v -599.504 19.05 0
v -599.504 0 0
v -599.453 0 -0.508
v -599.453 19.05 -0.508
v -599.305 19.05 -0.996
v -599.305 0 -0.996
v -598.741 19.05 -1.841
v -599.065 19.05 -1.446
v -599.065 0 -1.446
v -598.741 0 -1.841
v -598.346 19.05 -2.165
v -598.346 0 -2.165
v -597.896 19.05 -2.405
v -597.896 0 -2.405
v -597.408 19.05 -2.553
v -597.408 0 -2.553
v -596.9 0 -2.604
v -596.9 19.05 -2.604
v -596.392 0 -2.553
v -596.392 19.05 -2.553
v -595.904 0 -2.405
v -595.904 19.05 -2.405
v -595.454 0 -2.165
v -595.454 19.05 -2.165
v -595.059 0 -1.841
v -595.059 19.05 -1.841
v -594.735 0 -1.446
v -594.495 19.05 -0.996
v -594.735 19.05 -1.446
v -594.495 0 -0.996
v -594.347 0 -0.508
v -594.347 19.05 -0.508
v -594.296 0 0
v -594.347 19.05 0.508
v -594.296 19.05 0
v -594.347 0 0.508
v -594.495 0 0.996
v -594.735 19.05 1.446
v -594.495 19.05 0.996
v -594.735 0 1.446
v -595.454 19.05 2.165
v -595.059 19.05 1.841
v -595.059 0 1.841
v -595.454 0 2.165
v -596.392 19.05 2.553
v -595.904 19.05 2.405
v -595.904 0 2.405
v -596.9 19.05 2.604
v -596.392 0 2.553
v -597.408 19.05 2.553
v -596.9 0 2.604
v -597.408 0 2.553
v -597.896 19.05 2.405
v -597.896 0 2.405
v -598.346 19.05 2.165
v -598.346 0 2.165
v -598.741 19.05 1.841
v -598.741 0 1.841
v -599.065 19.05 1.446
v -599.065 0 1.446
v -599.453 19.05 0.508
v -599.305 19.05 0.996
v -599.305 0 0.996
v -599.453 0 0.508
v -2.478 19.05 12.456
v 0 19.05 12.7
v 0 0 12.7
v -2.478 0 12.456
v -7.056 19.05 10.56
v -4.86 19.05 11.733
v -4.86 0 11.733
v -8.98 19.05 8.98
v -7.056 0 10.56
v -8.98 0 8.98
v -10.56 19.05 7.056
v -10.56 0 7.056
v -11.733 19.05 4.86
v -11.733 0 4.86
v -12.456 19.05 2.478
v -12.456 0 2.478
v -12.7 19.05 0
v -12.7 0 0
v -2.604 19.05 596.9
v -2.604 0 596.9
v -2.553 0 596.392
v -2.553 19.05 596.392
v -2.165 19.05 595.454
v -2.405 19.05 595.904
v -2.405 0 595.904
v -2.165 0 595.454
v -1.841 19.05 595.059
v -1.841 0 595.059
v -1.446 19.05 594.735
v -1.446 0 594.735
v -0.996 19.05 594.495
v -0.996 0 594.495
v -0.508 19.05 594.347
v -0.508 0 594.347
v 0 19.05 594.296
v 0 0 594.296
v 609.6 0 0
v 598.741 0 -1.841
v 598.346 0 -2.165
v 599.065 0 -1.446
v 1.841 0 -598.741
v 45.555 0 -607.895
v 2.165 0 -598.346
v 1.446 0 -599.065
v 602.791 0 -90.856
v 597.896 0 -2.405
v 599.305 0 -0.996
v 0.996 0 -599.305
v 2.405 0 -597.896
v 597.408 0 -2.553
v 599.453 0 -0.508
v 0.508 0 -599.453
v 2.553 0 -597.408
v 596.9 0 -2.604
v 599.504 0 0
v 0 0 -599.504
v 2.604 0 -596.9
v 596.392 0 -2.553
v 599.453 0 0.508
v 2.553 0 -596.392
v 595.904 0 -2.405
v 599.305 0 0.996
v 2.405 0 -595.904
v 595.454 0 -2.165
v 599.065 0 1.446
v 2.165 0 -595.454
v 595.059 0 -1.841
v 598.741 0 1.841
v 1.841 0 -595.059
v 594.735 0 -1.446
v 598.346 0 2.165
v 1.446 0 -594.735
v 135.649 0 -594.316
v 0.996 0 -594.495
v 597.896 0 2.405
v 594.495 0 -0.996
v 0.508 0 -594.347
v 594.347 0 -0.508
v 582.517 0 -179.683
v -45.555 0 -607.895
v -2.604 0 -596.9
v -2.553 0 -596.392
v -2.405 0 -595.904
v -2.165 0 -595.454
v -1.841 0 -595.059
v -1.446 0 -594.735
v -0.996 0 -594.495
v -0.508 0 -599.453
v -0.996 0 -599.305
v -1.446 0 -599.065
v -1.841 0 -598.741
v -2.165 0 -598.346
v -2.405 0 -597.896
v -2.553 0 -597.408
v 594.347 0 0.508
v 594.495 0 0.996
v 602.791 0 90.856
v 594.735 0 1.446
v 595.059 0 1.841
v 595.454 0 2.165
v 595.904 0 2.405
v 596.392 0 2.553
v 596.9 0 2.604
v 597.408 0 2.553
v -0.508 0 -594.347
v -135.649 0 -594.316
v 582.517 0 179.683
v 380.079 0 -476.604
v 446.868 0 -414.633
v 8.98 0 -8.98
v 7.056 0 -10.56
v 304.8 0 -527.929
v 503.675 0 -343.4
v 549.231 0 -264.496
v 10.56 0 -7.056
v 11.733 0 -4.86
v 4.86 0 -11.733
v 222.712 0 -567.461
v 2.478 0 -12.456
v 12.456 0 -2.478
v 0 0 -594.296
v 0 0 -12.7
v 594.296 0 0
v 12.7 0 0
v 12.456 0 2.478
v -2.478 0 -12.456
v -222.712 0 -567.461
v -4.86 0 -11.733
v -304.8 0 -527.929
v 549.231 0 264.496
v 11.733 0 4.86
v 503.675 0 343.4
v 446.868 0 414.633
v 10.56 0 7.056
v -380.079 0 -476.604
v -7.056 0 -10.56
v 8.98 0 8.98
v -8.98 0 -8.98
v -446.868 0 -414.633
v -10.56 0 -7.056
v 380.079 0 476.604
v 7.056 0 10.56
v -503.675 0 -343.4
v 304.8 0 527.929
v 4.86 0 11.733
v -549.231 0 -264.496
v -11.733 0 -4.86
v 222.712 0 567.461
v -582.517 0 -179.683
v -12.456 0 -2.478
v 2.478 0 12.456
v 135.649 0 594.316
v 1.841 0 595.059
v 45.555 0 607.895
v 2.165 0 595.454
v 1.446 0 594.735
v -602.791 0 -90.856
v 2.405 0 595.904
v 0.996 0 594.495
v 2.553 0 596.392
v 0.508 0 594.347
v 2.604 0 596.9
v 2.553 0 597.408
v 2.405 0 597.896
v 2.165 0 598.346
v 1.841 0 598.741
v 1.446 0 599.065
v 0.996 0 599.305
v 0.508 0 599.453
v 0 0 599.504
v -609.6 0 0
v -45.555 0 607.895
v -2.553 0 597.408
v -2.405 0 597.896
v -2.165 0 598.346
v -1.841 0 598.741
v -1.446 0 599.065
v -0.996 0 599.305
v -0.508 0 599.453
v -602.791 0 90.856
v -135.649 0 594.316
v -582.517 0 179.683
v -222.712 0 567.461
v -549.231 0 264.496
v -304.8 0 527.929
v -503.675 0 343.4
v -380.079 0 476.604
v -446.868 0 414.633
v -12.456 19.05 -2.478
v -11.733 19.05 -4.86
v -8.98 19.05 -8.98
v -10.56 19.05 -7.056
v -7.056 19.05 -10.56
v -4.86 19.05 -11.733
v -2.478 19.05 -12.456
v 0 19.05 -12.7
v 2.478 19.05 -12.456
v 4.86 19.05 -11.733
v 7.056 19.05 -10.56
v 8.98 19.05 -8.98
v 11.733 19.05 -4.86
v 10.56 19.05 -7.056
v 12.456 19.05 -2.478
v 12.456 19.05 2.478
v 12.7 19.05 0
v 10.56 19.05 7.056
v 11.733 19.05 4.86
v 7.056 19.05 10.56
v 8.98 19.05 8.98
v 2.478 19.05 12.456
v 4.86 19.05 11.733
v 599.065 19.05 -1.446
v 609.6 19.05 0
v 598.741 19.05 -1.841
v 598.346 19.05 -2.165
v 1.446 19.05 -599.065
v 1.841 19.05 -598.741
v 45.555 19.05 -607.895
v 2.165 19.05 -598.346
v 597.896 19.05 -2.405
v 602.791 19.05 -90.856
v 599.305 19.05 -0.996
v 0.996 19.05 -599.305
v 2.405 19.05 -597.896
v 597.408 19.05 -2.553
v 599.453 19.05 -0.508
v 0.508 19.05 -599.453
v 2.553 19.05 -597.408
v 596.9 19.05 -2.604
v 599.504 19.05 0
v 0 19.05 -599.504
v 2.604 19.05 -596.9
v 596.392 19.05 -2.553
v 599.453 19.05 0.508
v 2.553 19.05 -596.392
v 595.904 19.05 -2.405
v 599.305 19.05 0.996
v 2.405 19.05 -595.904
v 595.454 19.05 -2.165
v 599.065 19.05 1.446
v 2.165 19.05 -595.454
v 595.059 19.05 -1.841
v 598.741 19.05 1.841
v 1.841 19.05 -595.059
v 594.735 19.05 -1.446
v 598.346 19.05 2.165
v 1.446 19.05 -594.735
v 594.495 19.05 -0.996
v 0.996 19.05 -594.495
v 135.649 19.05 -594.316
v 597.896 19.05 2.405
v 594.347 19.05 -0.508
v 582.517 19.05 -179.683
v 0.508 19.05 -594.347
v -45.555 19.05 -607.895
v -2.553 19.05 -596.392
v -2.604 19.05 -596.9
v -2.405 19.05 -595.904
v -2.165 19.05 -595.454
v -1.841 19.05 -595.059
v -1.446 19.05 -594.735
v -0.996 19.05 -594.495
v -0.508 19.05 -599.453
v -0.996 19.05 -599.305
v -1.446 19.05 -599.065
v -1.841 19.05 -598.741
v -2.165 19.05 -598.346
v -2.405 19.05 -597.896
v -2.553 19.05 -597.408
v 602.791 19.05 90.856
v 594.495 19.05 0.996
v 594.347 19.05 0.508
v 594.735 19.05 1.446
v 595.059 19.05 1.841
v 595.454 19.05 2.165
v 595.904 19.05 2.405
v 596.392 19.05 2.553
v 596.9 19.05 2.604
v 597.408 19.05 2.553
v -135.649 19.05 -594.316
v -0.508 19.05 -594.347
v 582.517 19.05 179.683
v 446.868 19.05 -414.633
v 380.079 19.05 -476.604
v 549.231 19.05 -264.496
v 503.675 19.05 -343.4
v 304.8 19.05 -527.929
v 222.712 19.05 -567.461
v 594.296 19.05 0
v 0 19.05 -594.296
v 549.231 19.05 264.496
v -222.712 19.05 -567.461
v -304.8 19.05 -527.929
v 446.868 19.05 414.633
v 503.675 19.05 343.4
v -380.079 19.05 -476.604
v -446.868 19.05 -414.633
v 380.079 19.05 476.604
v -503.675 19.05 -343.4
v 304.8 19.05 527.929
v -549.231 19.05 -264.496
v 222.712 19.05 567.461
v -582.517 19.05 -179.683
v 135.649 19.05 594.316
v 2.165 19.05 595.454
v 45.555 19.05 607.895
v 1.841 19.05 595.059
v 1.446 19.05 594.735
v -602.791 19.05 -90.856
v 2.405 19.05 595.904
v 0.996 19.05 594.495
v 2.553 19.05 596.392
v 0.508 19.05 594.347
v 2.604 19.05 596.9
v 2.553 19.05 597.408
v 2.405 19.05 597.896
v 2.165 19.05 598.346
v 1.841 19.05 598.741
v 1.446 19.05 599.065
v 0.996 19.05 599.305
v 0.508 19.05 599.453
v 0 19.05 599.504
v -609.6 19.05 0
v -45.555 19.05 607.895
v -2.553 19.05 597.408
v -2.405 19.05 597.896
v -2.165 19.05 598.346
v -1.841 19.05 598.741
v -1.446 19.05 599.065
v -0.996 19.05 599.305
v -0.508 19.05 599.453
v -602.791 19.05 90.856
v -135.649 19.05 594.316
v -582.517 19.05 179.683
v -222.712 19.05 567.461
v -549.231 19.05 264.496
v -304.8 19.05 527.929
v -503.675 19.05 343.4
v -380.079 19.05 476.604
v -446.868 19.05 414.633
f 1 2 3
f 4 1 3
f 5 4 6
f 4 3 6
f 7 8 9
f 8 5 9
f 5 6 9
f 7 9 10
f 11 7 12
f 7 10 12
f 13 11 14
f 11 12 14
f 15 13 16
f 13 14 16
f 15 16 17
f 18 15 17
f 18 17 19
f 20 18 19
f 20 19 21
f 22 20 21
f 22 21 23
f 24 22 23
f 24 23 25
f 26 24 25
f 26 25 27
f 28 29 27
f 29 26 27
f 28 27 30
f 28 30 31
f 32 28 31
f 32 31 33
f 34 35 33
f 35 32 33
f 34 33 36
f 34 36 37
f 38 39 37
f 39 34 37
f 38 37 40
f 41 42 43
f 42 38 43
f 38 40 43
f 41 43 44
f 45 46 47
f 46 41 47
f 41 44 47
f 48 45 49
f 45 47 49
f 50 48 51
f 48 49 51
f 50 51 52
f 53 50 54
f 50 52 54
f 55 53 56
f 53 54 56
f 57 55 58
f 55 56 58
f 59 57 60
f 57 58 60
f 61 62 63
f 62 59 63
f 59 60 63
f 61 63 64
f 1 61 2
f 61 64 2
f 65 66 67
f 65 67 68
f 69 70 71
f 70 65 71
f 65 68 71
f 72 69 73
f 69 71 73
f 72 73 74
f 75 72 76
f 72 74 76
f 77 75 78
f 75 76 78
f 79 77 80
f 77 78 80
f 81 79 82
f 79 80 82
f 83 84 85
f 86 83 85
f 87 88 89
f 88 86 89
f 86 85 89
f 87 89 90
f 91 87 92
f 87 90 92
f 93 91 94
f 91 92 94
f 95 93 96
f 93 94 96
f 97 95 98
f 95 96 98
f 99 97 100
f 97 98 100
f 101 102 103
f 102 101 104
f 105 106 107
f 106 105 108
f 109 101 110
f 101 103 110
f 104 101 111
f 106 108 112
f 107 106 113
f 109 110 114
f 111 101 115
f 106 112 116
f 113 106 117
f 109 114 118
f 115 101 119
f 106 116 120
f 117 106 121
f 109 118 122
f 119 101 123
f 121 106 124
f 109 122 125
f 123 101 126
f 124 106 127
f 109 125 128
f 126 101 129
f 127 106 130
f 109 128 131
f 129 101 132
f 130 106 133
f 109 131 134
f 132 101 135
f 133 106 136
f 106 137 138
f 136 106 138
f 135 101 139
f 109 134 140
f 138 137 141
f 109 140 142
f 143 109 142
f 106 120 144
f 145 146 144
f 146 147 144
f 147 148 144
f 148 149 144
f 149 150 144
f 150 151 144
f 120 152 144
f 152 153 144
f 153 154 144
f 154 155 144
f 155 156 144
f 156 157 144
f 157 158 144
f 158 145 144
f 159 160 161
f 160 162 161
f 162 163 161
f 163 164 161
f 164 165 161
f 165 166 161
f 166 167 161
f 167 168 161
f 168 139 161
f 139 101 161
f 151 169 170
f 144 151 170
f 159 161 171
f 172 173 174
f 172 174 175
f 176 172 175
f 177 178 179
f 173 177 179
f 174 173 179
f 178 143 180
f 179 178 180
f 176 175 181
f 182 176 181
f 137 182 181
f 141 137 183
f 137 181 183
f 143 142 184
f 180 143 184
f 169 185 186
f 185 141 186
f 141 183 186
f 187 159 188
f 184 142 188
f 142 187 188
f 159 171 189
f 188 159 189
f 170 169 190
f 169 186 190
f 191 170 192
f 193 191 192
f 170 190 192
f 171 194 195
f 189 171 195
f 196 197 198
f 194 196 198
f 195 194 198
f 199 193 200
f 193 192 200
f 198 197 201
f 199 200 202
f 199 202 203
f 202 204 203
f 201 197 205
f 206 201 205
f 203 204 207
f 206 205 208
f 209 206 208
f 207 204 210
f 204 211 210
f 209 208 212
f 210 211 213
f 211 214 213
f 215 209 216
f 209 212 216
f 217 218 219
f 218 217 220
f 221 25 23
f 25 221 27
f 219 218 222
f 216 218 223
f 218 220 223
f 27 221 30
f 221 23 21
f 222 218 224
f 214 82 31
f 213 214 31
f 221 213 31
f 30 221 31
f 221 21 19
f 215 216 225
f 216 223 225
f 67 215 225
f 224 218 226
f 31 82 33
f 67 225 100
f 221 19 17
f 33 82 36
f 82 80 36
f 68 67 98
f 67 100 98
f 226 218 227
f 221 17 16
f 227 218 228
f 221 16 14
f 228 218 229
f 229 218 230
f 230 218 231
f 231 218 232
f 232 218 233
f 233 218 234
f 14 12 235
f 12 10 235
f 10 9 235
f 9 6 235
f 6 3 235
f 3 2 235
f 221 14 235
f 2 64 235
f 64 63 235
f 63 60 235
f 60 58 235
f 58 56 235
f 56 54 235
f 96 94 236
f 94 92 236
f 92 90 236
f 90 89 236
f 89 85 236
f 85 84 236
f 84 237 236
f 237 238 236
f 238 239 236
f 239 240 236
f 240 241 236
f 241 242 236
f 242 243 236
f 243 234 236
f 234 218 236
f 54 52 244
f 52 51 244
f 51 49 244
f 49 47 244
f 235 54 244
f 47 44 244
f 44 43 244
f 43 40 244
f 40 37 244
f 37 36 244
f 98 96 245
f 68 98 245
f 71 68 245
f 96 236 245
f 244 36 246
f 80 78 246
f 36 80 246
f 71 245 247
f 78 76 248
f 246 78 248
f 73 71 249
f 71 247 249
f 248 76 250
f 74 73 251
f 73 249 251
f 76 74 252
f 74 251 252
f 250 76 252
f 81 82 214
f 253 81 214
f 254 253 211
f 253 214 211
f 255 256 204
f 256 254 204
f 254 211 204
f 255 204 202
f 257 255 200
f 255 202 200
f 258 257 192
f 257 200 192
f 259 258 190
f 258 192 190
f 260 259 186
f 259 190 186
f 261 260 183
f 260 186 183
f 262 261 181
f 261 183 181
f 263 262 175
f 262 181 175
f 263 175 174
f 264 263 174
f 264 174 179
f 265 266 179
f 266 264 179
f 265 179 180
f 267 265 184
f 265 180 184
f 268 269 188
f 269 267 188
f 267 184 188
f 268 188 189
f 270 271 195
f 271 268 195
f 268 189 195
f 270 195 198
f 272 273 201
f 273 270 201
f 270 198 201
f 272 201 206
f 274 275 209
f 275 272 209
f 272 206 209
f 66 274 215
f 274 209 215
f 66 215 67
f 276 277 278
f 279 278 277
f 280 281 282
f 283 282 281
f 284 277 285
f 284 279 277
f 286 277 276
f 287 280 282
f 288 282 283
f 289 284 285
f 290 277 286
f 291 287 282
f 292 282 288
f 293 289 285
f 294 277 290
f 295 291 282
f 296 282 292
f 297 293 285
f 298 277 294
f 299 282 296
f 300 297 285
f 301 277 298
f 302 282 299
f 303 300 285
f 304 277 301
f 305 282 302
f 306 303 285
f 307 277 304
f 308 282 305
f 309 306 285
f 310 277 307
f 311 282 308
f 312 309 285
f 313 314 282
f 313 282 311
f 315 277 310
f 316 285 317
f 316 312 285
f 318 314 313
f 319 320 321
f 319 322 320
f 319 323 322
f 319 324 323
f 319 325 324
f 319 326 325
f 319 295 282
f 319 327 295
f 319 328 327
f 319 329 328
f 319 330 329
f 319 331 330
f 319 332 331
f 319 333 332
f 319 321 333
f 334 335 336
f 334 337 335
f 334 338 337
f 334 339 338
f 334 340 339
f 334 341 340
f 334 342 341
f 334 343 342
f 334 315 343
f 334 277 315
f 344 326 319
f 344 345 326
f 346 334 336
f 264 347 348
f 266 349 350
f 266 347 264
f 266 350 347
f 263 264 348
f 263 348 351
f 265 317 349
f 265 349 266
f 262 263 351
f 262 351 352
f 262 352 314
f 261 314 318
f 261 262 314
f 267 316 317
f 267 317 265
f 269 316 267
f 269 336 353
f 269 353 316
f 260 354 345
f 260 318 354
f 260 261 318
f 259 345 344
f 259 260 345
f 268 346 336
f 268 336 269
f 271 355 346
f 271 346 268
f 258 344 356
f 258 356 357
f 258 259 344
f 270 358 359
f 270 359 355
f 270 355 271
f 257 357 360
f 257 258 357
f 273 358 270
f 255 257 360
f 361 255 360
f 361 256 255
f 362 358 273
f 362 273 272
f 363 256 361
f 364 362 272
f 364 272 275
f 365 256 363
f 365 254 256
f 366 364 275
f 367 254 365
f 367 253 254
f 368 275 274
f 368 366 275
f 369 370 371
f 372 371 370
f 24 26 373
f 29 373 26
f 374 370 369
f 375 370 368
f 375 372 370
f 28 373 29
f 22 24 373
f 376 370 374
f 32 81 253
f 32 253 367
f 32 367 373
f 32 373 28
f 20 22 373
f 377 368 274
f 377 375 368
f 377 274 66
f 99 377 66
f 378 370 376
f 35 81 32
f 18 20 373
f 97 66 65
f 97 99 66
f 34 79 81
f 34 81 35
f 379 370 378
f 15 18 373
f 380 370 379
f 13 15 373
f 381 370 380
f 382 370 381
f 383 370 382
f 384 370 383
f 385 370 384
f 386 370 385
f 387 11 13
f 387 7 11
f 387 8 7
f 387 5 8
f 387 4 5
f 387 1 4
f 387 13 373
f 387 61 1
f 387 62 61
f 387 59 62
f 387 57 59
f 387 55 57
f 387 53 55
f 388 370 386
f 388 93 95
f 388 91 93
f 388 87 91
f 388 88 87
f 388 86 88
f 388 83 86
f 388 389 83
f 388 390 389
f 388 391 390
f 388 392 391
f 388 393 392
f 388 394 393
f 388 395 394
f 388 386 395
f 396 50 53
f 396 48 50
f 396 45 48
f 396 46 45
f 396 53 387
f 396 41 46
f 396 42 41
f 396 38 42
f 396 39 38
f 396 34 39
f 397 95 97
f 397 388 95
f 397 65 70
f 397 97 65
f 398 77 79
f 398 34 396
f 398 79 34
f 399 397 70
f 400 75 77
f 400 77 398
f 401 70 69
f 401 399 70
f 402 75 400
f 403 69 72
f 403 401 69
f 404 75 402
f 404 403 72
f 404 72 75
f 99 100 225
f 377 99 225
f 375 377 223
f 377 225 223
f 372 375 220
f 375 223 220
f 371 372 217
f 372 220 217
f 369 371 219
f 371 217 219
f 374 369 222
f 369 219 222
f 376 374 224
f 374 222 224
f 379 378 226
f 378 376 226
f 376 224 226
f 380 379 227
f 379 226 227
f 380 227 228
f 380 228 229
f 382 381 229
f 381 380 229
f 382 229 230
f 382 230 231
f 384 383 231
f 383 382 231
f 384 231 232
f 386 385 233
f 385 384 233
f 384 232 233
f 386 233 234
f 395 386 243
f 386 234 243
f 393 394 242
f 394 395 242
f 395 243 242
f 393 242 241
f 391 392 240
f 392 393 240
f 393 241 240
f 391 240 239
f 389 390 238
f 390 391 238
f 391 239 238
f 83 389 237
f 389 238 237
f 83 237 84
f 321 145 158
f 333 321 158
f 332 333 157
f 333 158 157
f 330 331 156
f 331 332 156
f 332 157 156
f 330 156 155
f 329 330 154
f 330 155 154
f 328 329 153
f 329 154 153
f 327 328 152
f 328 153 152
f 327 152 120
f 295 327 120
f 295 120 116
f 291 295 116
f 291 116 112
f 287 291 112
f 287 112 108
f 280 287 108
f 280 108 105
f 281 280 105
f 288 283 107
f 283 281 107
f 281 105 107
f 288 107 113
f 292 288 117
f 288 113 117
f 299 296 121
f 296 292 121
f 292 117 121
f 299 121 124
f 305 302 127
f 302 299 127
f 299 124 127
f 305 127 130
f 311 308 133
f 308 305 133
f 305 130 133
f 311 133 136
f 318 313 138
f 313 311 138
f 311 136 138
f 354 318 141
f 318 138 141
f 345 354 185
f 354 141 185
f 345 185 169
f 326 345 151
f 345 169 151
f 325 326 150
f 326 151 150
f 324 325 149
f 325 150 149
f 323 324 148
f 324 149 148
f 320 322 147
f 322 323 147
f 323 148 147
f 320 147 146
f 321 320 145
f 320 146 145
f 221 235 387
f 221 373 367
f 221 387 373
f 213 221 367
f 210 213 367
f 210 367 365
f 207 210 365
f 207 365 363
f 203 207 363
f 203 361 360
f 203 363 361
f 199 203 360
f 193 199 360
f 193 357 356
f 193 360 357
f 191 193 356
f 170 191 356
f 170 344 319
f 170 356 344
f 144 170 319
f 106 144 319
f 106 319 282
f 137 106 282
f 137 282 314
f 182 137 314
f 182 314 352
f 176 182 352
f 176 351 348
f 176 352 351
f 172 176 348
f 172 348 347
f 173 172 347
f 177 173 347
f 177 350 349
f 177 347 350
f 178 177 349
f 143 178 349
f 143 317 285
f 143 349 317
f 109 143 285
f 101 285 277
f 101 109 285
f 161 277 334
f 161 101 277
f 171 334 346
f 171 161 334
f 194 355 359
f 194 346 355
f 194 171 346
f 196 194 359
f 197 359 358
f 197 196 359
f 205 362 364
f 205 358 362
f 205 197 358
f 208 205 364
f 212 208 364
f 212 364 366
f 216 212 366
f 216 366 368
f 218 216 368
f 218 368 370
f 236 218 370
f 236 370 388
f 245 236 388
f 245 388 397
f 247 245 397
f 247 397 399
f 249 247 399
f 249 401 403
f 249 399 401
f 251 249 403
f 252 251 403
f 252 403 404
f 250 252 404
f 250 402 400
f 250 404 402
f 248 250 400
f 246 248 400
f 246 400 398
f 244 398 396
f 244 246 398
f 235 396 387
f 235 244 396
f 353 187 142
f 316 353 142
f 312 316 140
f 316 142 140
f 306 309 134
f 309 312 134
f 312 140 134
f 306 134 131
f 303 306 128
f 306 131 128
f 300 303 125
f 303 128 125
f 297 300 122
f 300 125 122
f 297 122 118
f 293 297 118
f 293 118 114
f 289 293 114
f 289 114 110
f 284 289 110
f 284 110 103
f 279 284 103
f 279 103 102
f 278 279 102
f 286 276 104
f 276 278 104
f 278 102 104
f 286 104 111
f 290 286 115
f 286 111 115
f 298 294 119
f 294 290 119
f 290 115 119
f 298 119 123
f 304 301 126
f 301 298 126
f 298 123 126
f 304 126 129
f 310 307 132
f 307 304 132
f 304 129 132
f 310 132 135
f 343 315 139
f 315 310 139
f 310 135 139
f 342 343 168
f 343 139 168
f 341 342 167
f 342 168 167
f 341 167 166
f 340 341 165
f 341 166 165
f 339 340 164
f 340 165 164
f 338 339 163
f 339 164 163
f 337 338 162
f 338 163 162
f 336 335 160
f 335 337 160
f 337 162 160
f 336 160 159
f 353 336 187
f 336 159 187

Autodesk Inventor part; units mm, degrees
ref_plane "YZ Plane" through (0, 0, 0) normal (1, 0, 0) x (0, 1, 0)
ref_plane "XZ Plane" through (0, 0, 0) normal (0, 1, 0) x (-1, 0, 0)
ref_plane "XY Plane" through (0, 0, 0) normal (0, 0, 1) x (1, 0, 0)
sketch "Sketch1" plane through (0, 0, 0) normal (0, 1, 0) x (-1, 0, 0)
  circle A0 centre (0, 0) radius 609.6
  circle A1 centre (0, 0) radius 12.7
  circle A2 centre (0, 596.9) radius 2.6035
  line L0 (0, 12.7) -> (0, 594.2965)
  circle A3 centre (-596.9, 0) radius 2.6035
  circle A4 centre (0, -596.9) radius 2.6035
  circle A5 centre (596.9, 0) radius 2.6035
  point P0 (-594.2965, 0)
  point P1 (0, -594.2965)
  point P2 (594.2965, 0)
  dimension "d5" = 25.4
  dimension "d6" = 5.207
  dimension "d0" = 1219.2
  dimension "d7" = 596.9
  dimension "d10" = 360
extrude "Extrusion1" add sketch "Sketch1" along normal blind 19.05
properties part number "bottom" material "Wood (Birch)"
